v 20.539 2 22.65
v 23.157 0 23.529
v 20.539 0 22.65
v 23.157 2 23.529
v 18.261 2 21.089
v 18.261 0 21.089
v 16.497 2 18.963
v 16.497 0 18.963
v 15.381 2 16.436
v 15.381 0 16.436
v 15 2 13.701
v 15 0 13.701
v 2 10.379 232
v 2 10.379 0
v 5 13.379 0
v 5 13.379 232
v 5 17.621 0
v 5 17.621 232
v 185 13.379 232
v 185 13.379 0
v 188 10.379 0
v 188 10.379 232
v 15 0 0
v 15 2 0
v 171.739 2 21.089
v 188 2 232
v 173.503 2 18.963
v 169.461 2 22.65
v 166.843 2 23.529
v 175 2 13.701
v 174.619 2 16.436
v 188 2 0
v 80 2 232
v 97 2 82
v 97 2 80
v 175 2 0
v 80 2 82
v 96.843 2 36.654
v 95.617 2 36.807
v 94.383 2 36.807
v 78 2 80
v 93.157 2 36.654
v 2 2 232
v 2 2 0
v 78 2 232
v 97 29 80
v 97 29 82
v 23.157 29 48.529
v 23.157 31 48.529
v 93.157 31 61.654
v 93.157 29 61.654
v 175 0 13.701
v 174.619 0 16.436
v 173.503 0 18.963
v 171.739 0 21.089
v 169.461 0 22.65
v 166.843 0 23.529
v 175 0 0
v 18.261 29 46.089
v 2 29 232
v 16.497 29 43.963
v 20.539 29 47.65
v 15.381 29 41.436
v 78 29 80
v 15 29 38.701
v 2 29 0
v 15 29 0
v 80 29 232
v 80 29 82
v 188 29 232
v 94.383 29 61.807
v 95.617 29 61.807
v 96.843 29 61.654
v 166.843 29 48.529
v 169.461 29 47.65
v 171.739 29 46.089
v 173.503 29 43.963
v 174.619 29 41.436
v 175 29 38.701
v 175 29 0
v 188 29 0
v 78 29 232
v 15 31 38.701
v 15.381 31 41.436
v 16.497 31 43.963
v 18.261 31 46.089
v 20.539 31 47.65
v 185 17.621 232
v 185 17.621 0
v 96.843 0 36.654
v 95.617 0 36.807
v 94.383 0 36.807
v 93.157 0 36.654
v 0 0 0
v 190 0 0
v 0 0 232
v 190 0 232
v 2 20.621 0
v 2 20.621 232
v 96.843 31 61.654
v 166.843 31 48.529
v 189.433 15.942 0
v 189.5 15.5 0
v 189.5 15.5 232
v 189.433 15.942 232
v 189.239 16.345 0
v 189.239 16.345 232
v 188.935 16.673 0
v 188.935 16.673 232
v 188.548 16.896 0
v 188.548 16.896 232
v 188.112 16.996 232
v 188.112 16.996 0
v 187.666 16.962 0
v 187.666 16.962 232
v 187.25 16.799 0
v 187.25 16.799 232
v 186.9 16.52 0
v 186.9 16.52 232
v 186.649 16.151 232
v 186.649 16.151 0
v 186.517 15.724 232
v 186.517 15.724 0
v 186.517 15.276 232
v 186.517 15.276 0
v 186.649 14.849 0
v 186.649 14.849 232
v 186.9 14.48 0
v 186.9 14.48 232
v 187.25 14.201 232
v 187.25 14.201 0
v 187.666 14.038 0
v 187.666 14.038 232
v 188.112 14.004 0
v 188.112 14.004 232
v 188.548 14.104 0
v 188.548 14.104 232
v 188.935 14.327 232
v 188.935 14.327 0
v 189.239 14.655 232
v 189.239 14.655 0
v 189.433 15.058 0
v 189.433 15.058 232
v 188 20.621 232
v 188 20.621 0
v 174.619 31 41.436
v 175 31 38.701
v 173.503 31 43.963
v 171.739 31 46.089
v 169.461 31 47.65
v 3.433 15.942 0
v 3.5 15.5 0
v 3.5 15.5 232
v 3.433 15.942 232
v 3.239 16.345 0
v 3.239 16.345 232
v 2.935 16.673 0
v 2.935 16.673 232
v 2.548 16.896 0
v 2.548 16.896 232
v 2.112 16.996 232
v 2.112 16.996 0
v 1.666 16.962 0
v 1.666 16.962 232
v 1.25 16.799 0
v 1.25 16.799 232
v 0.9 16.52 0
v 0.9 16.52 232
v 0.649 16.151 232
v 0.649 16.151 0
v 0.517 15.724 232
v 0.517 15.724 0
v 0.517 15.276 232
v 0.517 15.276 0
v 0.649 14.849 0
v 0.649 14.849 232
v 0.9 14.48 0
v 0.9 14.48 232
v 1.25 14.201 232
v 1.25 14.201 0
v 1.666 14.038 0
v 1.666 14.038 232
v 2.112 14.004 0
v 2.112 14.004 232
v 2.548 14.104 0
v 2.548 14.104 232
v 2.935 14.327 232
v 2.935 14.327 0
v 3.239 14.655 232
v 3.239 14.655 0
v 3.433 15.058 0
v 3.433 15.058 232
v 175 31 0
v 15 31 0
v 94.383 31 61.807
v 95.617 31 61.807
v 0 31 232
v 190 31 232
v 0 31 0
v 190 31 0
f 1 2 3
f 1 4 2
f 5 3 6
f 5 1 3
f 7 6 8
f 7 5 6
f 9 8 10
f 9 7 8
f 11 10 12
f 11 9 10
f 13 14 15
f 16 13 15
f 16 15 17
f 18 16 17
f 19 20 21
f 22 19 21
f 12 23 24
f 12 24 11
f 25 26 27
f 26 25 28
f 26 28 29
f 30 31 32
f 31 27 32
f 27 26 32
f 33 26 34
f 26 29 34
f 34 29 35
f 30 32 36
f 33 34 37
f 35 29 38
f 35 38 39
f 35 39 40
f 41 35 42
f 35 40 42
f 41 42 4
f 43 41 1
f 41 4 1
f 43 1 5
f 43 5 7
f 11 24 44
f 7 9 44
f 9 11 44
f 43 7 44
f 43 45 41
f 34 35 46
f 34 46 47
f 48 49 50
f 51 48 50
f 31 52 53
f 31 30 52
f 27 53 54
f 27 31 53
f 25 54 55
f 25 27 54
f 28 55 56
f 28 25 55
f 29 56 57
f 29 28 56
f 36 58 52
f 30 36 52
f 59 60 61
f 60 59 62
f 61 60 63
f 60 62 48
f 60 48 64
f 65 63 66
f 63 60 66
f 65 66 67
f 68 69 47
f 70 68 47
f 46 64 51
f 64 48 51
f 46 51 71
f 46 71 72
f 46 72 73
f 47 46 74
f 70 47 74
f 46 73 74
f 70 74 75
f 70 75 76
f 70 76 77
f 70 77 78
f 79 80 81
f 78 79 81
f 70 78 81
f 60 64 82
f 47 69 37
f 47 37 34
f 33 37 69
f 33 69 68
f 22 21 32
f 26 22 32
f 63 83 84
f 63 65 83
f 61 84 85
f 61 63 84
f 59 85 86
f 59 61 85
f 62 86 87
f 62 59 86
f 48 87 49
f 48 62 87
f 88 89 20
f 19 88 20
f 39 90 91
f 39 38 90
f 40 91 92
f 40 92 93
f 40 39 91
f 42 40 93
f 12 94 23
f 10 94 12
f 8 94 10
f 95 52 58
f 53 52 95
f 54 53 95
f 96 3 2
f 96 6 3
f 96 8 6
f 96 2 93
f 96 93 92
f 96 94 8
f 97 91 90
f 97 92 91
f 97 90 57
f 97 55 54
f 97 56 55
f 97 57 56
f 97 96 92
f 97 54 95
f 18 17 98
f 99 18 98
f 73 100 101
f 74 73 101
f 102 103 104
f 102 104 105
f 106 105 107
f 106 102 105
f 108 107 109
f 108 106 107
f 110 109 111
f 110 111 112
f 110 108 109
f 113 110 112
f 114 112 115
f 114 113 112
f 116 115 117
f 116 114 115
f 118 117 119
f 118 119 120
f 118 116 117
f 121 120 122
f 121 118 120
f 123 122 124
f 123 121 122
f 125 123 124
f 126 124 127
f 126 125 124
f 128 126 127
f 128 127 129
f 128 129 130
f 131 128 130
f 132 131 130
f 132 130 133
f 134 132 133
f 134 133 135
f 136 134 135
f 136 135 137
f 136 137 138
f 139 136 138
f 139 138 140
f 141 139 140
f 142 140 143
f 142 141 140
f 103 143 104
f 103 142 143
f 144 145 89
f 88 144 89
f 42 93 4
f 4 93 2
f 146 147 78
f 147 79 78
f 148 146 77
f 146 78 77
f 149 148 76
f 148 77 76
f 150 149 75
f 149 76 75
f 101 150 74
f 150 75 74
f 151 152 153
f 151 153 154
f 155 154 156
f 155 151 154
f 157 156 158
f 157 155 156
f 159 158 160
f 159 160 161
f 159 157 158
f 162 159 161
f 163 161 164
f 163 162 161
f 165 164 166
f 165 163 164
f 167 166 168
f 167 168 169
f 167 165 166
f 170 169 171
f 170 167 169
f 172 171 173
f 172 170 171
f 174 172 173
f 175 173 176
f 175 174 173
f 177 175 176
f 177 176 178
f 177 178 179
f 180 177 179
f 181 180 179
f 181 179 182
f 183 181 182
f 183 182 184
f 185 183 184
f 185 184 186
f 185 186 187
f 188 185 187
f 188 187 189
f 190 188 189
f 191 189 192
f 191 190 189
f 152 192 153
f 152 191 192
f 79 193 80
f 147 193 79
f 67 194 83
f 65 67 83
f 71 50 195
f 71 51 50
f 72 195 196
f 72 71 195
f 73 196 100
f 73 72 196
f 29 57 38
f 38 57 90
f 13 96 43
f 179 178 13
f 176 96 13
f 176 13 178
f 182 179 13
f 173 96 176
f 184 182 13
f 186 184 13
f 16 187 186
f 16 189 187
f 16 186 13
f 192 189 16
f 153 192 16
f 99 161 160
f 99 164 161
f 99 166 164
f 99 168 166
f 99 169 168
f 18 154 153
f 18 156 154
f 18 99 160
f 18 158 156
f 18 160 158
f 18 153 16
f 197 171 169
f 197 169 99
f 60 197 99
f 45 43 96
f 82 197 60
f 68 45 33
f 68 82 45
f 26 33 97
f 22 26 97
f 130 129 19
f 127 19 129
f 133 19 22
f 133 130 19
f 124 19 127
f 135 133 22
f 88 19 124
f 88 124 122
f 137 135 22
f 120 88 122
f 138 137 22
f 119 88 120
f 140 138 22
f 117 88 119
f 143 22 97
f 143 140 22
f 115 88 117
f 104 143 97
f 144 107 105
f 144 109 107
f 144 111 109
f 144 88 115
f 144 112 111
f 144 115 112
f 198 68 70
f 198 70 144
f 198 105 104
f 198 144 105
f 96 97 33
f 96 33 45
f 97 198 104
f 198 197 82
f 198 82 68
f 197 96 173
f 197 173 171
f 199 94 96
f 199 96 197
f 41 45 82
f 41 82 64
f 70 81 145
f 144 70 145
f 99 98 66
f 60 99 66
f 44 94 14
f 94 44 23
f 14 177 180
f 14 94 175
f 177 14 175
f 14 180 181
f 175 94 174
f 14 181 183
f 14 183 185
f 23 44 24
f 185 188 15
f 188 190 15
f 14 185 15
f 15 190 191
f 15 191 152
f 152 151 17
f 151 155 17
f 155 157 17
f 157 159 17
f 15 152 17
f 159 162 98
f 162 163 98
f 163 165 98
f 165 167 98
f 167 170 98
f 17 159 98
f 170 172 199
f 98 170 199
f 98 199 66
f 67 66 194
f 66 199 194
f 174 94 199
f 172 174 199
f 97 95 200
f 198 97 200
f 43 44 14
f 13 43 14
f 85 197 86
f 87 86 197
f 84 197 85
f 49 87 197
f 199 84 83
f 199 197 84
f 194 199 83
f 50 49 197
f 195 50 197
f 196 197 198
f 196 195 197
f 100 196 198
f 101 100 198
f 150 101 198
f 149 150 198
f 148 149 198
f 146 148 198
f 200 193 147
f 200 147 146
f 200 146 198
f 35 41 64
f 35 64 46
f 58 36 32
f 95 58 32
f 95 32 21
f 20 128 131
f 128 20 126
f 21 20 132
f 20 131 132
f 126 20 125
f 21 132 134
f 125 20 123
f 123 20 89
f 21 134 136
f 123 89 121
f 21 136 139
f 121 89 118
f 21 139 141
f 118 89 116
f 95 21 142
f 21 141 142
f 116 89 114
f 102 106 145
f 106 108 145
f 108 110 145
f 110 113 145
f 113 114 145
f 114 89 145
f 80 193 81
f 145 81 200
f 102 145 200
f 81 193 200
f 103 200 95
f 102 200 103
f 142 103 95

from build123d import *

# Parameters (mm, degrees)
F0_W     = 190
F0_H     = 31
F0_R     = 1.5
F1_DEPTH = 232
F2_W     = 2
F2_H     = 150
F2_H_2   = 2
F2_W_2   = 17
F3_DEPTH = 29.5
F4_W     = 160
F4_H     = 47
F5_DEPTH = 5
F6_W     = 160
F6_H     = 22
F7_DEPTH = 5
F8_R     = 10


with BuildPart() as f1:
    # F0 (on Top) → F1 (new body)
    with BuildSketch(Plane.XY):
        with Locations((95, 15.5)):
            Rectangle(F0_W, F0_H)
        with Locations((2, 15.5)):
            Circle(F0_R, mode=Mode.SUBTRACT)
        Polygon((188, 2), (2, 2), (2, 10.3786796564), (5, 13.3786796564), (5, 17.6213203436), (2, 20.6213203436), (2, 29), (188, 29), (188, 20.6213203436), (185, 17.6213203436), (185, 13.3786796564), (188, 10.3786796564), align=None, mode=Mode.SUBTRACT)
        with Locations((188, 15.5)):
            Circle(F0_R, mode=Mode.SUBTRACT)
    extrude(amount=F1_DEPTH)

    # F2 (on face) → F3 (join)
    with BuildSketch(Plane.XZ):
        with Locations((79, 157)):
            Rectangle(F2_W, F2_H)
        with Locations((79, 81)):
            Rectangle(F2_W, F2_H_2)
        with Locations((88.5, 81)):
            Rectangle(F2_W_2, F2_H_2)
    extrude(amount=-F3_DEPTH)

    # F4 (on face) → F5 (cut)
    with BuildSketch(Plane(origin=(0, 31, 0), x_dir=(-1, 0, 0), z_dir=(0, 1, 0))):
        Polygon((-95, 62), (-175, 47), (-15, 47), align=None)
        with Locations((-95, 23.5)):
            Rectangle(F4_W, F4_H)
    extrude(amount=-F5_DEPTH, mode=Mode.SUBTRACT)

    # F6 (on face) → F7 (cut)
    with BuildSketch(Plane.XZ):
        Polygon((95, 37), (15, 22), (175, 22), align=None)
        with Locations((95, 11)):
            Rectangle(F6_W, F6_H)
    extrude(amount=-F7_DEPTH, mode=Mode.SUBTRACT)

    # F8
    f8_edges = [f1.edges().sort_by_distance(p)[0] for p in [
        (15, 30, 47),
        (15, 1, 22),
        (175, 30, 47),
        (175, 1, 22),
        (95, 30, 62),
        (95, 1, 37),
    ]]
    fillet(f8_edges, radius=F8_R)


solid = f1.part
